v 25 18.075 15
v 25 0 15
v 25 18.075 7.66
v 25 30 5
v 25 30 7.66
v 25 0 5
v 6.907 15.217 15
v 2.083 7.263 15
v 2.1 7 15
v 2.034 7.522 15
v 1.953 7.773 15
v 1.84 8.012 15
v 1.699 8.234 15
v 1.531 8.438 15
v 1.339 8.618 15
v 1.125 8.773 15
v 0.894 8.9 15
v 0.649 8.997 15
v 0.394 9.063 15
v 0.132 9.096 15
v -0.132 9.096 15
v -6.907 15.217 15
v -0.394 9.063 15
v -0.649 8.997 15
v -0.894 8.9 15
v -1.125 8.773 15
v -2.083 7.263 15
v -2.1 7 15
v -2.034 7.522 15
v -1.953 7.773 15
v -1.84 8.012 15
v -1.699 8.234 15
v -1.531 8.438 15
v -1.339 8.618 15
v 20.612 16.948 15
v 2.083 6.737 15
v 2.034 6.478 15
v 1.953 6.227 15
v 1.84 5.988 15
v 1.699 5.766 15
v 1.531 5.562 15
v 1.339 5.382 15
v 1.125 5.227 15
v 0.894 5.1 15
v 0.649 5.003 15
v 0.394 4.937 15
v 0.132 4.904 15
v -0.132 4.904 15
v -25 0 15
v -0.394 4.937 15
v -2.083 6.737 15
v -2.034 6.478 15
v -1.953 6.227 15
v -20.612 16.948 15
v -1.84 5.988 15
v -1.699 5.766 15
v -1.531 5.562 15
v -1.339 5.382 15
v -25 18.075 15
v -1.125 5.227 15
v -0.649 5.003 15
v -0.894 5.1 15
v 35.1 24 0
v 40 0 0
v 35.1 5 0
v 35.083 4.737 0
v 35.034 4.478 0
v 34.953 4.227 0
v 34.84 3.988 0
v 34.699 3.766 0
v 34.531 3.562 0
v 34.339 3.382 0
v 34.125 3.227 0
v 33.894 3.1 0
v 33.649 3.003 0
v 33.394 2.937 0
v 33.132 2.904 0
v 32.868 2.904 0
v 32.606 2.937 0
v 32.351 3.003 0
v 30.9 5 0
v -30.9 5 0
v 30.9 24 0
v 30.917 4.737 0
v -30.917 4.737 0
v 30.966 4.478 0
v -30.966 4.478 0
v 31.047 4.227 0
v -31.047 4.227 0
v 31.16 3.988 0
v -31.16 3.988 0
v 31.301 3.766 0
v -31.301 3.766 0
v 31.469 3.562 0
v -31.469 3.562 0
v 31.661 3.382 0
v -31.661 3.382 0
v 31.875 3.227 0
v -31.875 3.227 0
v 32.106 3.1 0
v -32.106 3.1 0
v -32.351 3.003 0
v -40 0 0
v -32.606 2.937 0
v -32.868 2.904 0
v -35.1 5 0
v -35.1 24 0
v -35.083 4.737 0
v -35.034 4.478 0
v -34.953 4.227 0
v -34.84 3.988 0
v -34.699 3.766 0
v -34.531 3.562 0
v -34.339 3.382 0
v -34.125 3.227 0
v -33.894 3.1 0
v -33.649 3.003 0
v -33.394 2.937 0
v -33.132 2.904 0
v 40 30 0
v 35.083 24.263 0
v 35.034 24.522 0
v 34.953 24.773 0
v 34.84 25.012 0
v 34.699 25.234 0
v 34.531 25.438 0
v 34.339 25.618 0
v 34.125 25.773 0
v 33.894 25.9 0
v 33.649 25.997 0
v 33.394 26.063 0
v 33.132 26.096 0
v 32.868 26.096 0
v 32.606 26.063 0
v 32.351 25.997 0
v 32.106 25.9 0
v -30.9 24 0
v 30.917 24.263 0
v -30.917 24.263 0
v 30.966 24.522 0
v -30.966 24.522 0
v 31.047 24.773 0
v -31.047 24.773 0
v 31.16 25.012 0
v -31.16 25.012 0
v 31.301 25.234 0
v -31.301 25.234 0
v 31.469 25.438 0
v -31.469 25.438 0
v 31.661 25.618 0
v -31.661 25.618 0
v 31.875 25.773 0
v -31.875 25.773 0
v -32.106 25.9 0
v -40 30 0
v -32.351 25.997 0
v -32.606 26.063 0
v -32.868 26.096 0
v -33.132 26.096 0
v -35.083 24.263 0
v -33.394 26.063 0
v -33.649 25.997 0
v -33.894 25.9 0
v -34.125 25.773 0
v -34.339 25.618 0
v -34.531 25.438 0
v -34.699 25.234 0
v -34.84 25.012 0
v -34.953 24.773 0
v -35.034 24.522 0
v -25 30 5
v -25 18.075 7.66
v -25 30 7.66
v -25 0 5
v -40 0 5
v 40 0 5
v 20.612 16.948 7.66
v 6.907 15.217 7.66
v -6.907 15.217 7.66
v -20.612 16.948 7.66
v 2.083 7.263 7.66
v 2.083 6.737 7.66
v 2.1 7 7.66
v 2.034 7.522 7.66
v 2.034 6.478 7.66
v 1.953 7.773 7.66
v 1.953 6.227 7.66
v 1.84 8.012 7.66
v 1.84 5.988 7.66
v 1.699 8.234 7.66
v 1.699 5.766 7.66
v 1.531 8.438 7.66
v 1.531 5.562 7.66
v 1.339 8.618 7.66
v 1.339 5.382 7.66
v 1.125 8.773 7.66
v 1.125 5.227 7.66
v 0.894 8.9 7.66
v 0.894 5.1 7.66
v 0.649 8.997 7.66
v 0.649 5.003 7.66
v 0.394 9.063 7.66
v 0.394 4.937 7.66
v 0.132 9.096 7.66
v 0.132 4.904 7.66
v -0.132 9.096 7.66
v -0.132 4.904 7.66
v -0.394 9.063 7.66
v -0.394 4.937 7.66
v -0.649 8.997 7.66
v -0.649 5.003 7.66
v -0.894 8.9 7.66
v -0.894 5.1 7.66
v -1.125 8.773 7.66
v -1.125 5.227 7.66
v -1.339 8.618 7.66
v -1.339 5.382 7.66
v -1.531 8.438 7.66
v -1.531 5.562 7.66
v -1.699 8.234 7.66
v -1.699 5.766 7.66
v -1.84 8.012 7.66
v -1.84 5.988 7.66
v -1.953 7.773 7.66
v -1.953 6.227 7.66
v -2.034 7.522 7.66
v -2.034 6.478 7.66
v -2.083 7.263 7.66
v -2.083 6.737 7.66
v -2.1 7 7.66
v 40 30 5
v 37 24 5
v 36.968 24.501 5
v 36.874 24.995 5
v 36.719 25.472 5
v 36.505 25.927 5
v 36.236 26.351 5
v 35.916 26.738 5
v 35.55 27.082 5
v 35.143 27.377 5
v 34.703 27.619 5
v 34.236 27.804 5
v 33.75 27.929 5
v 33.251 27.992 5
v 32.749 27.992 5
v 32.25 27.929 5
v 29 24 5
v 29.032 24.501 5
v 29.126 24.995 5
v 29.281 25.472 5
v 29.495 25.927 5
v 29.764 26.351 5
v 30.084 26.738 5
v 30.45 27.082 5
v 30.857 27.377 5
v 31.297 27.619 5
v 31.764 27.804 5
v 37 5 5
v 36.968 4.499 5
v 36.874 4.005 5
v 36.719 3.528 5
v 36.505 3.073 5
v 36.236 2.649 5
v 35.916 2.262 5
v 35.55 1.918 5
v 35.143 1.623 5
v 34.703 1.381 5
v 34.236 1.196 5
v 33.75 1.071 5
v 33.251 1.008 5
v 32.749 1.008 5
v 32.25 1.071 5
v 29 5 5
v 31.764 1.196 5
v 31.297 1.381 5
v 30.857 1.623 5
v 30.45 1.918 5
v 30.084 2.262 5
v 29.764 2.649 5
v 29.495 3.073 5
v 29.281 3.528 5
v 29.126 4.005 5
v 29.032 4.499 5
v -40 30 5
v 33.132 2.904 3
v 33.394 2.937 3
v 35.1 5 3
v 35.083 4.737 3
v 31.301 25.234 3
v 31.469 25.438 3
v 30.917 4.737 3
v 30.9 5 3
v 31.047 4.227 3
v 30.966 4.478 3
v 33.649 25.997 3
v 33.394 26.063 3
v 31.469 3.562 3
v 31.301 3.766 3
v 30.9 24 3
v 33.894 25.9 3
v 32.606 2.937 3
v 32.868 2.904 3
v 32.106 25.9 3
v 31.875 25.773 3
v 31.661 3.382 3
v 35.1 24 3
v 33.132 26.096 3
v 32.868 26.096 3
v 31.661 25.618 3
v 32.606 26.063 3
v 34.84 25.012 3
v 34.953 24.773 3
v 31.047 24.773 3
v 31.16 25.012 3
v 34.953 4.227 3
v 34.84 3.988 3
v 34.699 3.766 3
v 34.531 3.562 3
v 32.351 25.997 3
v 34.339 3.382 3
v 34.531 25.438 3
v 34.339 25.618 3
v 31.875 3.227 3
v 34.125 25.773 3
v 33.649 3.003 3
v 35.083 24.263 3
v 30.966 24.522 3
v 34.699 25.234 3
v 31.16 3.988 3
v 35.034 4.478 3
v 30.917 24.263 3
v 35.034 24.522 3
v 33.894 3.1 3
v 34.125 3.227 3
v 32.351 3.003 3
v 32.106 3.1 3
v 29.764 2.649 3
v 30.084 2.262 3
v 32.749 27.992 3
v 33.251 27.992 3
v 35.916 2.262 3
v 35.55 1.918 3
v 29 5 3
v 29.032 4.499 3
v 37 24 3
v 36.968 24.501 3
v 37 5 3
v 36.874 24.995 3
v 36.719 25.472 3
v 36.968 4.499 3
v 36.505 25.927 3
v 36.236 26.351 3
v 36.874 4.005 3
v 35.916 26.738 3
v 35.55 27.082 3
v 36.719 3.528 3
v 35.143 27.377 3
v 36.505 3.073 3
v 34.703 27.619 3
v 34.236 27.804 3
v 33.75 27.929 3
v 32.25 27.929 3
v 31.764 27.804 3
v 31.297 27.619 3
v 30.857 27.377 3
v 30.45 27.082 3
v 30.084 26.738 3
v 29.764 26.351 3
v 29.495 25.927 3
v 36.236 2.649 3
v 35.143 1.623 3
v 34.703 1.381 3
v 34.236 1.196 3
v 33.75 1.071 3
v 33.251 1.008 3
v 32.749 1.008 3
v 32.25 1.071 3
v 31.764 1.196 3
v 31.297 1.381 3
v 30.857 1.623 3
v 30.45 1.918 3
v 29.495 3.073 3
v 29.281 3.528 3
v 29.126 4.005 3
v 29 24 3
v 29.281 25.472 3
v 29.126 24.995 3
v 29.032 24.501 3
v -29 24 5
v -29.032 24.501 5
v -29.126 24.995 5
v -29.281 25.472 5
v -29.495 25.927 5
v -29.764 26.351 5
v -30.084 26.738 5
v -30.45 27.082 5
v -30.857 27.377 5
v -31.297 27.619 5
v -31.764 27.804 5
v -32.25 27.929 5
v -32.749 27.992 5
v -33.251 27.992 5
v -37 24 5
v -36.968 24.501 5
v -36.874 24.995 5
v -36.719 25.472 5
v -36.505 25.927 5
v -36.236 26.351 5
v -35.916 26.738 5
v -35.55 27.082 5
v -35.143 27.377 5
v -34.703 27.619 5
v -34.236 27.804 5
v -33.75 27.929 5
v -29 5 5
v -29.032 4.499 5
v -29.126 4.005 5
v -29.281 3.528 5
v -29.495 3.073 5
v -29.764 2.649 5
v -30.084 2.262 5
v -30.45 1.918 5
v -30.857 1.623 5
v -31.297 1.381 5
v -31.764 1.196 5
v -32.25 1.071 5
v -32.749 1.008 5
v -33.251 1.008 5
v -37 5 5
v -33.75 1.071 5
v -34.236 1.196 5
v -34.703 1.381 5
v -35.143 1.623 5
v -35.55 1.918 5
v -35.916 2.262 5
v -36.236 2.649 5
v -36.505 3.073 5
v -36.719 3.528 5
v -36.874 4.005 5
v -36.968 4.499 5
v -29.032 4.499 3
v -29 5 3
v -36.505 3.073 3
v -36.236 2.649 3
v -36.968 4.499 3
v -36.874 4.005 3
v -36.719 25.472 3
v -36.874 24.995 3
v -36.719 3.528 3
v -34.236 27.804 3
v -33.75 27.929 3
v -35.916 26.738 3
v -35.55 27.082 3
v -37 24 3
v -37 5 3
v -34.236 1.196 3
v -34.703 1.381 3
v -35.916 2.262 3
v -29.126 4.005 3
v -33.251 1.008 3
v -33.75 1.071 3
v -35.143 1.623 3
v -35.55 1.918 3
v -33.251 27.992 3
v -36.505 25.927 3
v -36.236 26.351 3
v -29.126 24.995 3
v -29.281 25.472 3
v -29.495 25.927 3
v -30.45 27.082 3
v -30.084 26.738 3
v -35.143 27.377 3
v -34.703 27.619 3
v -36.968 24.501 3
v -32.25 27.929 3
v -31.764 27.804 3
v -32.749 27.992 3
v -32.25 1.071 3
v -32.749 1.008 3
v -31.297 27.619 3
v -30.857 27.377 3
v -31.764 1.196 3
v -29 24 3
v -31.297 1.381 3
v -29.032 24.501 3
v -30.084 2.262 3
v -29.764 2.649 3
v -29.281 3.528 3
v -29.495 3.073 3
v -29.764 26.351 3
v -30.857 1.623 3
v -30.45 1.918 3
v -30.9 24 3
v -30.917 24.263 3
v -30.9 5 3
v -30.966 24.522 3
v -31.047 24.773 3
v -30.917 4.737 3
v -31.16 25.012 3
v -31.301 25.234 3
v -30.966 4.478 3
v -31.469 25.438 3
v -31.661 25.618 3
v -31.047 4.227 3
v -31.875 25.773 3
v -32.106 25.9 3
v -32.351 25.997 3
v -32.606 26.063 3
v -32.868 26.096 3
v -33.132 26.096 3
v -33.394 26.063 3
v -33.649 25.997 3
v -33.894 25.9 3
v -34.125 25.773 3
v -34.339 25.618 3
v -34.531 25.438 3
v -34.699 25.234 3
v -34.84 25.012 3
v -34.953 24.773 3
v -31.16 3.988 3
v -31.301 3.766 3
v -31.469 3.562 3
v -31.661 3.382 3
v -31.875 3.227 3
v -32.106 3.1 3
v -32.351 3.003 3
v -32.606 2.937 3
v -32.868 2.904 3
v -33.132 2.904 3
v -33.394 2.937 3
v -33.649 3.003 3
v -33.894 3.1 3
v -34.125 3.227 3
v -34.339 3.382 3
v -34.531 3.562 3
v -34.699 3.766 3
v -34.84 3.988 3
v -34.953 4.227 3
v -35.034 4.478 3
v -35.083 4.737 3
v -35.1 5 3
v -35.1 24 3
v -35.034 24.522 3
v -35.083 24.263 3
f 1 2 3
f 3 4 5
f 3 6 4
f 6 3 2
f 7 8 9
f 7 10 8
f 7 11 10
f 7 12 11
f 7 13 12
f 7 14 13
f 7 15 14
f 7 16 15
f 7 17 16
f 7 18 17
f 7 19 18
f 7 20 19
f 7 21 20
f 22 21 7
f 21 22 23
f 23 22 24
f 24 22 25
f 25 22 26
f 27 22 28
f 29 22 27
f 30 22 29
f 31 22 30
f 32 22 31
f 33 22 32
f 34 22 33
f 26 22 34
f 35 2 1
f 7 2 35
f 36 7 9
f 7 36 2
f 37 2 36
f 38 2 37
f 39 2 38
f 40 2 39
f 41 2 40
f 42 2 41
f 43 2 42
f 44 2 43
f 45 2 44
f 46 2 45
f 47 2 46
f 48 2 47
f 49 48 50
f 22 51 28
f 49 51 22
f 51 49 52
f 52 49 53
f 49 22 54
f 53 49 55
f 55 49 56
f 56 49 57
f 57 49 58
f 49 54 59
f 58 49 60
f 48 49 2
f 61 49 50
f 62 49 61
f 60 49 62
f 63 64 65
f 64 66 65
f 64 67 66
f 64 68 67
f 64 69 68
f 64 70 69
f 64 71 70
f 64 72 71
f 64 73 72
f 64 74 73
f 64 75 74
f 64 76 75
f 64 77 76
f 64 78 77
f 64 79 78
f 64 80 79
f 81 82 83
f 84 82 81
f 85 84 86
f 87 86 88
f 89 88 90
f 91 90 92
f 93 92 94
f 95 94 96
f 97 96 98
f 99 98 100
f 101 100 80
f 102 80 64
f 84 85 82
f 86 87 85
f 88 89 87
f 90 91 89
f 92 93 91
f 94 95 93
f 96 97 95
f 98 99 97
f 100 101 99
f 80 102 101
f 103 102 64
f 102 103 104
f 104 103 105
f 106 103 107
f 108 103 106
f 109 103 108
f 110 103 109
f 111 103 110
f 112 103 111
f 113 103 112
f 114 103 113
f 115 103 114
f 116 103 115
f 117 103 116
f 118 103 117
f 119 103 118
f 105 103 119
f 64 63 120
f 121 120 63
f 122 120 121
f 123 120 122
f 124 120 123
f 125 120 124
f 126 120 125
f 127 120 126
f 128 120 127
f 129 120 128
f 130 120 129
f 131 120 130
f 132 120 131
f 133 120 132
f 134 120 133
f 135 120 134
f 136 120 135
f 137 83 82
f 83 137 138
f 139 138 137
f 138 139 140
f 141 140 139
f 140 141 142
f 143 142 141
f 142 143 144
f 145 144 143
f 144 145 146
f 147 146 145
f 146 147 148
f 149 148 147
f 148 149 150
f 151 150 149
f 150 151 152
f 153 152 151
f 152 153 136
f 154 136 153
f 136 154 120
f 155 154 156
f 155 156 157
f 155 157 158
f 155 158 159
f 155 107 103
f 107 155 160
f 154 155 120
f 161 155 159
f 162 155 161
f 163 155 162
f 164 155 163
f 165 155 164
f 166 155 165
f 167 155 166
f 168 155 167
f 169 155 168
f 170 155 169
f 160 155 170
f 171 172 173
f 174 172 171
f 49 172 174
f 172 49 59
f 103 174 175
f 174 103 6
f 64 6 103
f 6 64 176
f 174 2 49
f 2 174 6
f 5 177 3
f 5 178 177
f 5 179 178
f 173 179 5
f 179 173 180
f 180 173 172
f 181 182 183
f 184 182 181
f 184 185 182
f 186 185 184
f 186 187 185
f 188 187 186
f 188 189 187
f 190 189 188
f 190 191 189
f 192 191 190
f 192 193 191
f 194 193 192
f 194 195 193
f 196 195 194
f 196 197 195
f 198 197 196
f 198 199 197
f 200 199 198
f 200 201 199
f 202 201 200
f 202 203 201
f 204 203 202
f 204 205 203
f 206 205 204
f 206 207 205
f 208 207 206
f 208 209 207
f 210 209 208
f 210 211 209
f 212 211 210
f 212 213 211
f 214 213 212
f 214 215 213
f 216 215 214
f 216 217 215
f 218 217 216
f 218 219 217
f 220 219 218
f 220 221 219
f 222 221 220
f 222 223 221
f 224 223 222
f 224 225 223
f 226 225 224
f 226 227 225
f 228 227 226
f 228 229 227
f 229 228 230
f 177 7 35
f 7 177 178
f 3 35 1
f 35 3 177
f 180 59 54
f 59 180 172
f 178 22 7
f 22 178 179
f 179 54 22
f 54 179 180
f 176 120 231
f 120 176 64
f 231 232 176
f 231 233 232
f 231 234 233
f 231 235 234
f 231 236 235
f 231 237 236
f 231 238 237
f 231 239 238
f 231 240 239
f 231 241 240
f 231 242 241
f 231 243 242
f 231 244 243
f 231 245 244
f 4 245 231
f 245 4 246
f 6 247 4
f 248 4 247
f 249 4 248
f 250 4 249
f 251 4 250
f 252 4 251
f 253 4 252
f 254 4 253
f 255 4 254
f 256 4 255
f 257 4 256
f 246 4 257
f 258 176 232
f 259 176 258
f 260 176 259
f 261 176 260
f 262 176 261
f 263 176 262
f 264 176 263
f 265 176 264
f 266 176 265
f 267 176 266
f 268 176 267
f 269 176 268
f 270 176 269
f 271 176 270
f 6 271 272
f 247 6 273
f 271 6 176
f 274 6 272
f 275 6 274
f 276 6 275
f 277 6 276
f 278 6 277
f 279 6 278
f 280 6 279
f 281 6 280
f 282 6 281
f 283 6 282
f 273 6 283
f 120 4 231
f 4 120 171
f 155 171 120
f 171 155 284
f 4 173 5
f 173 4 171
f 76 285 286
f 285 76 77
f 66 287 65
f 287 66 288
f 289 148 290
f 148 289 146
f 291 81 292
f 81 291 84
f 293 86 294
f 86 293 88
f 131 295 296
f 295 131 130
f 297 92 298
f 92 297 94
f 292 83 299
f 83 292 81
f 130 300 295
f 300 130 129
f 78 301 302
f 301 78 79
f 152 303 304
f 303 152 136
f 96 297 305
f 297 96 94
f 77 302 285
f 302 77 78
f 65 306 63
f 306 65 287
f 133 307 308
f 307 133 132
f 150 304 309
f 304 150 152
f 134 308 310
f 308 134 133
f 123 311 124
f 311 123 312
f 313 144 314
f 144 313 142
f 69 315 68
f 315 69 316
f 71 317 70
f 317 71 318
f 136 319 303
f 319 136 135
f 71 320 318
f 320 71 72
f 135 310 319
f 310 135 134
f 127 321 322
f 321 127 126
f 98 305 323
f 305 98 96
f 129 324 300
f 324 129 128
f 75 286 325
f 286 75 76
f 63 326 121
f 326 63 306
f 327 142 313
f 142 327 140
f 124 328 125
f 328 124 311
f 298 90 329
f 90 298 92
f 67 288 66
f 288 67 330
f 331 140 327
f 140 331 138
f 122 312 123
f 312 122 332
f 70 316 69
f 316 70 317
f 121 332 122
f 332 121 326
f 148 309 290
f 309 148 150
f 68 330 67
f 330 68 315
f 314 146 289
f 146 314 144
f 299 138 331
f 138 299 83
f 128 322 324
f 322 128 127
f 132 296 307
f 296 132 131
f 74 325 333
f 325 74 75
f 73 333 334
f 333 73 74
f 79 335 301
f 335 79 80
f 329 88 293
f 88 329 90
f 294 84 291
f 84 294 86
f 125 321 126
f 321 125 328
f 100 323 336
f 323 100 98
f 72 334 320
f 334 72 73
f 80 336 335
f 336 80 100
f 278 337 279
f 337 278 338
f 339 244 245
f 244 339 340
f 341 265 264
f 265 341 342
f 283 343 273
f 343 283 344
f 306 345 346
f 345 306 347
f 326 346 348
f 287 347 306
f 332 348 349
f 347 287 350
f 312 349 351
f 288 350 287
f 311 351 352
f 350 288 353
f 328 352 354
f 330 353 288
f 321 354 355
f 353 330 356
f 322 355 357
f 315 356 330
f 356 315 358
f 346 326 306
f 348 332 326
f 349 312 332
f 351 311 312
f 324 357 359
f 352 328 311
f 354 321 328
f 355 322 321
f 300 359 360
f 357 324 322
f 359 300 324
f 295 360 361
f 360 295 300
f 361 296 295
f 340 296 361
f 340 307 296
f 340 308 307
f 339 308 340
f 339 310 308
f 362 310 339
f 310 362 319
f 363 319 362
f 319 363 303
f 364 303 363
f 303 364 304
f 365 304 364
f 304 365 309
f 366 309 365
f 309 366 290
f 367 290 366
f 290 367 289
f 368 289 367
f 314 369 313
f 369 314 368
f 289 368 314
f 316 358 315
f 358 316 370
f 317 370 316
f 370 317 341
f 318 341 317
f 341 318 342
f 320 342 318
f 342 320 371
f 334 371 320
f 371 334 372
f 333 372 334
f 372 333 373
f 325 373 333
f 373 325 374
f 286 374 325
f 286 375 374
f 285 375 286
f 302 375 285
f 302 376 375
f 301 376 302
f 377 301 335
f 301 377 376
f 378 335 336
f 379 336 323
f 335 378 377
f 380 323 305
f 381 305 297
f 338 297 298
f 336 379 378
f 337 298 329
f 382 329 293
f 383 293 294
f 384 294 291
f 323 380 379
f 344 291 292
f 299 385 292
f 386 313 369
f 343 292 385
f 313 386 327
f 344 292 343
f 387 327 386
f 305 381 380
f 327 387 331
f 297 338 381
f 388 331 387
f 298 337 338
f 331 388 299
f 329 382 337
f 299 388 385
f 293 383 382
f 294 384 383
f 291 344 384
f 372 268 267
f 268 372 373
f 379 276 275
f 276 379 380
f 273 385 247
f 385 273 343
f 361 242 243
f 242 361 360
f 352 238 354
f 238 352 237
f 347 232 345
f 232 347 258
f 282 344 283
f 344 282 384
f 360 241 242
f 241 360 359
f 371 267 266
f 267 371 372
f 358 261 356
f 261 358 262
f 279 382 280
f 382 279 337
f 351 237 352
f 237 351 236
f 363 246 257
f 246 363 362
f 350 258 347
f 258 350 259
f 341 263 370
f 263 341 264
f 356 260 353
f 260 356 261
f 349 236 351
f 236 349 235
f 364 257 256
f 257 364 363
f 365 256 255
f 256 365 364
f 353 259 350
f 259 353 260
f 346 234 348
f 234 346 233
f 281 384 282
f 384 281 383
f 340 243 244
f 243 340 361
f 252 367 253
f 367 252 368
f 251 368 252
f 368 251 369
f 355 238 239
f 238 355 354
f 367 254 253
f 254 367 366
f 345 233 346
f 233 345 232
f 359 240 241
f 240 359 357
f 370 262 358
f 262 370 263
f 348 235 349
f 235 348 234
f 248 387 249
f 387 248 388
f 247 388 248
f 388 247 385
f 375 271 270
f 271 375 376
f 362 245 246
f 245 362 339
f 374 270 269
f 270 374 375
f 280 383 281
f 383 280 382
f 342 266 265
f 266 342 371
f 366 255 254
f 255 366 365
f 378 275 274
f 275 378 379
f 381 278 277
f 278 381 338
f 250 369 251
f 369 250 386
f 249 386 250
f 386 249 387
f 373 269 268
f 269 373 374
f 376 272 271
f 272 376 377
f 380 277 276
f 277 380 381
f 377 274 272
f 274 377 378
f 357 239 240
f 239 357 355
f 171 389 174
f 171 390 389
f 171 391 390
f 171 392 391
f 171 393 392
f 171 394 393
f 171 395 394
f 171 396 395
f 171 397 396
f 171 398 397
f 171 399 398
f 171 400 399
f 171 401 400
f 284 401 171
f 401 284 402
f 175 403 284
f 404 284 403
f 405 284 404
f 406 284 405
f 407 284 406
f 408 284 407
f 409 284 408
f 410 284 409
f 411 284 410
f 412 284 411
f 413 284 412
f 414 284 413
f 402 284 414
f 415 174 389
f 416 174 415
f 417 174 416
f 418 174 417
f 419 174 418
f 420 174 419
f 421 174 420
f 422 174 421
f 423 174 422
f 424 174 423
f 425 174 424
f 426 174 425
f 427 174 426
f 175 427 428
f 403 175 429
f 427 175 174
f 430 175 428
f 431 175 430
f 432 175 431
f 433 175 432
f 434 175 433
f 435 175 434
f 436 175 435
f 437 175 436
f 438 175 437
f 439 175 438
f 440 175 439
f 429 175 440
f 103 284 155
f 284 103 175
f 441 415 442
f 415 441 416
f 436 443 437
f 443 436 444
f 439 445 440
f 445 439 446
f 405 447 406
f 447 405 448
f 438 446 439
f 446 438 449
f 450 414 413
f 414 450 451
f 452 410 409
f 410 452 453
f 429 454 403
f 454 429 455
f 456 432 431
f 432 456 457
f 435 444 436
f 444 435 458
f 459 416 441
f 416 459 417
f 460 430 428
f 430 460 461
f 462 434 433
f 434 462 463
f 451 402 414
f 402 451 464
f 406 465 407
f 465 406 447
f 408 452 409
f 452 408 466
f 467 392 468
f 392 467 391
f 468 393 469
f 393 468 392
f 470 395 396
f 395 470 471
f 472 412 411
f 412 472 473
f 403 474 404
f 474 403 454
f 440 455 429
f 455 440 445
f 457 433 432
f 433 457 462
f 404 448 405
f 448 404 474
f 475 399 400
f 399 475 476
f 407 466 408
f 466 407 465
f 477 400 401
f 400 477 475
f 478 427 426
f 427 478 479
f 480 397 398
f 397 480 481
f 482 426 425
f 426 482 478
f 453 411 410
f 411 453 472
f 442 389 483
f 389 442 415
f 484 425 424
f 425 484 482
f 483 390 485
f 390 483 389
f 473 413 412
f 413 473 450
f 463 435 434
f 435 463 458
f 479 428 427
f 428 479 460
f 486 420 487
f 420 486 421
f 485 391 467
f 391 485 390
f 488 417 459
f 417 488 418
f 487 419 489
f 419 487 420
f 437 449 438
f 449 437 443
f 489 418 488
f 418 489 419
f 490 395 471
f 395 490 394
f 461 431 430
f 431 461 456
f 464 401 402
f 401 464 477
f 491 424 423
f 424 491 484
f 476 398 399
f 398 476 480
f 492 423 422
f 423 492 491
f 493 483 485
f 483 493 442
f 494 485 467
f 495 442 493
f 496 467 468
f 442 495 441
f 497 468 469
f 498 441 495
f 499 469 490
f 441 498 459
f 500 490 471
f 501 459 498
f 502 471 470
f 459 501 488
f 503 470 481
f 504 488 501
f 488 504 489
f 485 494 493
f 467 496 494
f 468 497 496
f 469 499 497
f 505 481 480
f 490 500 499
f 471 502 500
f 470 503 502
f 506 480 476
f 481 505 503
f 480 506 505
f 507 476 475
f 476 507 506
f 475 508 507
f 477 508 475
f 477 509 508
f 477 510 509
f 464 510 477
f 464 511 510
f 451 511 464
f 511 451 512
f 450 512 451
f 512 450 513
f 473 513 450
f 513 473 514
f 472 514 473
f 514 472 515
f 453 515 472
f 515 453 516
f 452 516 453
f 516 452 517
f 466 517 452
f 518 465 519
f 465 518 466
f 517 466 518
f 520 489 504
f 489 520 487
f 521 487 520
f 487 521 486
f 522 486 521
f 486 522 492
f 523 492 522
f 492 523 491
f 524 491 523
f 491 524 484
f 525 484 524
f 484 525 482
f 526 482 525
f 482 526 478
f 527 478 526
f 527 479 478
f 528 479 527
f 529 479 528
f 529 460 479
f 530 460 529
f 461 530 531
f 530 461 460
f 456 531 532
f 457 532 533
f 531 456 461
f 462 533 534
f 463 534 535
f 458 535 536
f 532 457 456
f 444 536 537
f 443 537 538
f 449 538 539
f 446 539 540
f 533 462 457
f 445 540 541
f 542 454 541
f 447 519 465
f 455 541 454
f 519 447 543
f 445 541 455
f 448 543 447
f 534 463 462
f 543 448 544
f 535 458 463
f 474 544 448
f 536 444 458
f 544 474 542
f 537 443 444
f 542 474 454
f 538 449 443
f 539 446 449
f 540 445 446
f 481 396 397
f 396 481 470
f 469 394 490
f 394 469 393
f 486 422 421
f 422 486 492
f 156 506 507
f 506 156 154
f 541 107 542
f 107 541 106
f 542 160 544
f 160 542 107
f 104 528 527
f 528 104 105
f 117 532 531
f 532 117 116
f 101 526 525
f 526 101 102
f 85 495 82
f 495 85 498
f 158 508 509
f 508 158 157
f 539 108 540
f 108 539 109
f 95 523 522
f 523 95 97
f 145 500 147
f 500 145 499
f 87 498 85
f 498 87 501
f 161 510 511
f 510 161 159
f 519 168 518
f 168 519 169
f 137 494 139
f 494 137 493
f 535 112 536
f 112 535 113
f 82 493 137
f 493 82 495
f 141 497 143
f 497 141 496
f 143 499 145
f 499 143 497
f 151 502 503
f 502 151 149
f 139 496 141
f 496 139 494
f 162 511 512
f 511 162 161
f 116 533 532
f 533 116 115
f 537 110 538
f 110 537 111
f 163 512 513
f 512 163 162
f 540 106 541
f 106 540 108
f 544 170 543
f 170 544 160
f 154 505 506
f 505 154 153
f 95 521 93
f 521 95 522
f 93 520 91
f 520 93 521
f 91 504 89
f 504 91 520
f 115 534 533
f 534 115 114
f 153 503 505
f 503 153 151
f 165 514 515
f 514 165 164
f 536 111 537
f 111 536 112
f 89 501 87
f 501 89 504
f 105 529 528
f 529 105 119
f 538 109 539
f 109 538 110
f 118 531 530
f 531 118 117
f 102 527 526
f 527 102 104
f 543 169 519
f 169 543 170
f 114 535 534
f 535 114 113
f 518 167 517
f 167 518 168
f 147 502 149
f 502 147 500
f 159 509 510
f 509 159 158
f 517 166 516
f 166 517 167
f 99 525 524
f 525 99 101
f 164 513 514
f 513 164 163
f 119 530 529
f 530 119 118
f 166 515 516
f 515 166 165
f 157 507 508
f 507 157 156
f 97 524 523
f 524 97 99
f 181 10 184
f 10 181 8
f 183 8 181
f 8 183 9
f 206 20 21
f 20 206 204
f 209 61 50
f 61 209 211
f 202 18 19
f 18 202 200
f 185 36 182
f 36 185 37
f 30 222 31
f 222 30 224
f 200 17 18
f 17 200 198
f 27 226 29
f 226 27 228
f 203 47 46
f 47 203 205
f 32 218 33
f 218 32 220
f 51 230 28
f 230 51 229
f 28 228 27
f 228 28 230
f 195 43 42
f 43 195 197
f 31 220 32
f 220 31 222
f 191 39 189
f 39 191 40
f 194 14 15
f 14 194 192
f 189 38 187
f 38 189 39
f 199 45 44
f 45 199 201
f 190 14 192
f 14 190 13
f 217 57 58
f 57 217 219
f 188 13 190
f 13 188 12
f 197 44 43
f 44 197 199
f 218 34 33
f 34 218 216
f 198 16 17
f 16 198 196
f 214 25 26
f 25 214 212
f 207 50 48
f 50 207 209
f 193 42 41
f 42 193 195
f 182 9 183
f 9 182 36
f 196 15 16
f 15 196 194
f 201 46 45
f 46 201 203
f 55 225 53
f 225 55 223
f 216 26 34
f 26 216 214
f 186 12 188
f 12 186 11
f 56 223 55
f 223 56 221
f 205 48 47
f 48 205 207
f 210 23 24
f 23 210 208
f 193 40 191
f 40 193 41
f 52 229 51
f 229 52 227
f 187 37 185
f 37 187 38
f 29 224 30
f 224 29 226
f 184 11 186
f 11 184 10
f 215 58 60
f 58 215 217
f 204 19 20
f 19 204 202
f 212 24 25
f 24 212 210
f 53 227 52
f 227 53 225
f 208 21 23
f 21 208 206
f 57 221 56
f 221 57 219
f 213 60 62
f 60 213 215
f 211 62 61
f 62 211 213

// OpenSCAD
hotbed_diam = 220;
hotbed_thickness = 3.1;
s_thickness = 15;
s_lenght = 50;
s_widht = 20;
zplate_diam = 220;
zplate_thickness = 4.24;
back_support = 30;
support_widht = 10;
support_length = 15;

$fn = 50;
union(){
difference(){
union(){
difference(){
    translate([-s_lenght/2,0,0]) cube([s_lenght,s_widht,s_thickness]);
   
    translate([0,hotbed_diam/2+s_widht-5,(s_thickness-hotbed_thickness-zplate_thickness)]) cylinder(r=hotbed_diam/2,h=10);
    }
difference(){
    translate([s_lenght/2,0,0]) cube([support_length,back_support,5]);
    hull() {
        translate([s_lenght/2+8,5,0]) cylinder(r=2.1,h=5,center=false);
        translate([s_lenght/2+8,back_support-6,0]) cylinder(r=2.1,h=5,center=false);
    }
    hull() {
        translate([s_lenght/2+8,5,3]) cylinder(r=4,h=5,center=false);
        translate([s_lenght/2+8,back_support-6,3]) cylinder(r=4,h=5,center=false);}
}    

difference(){
    translate([(-s_lenght/2)-support_length,0,0]) cube([support_length,back_support,5]);
    hull() {
        translate([-s_lenght/2-8,5,3]) cylinder(r=4,h=5,center=false);
        translate([-s_lenght/2-8,back_support-6,3]) cylinder(r=4,h=5,center=false);
    }
    
        hull() {
        translate([-s_lenght/2-8,5,0]) cylinder(r=2.1,h=5,center=false);
        translate([-s_lenght/2-8,back_support-6,0]) cylinder(r=2.1,h=5,center=false);}
    }

}
translate([0,s_widht/2-3,0]) cylinder(r=2.1, h=s_widht);
}
translate([-s_lenght/2,0,0]) cube([s_lenght,s_widht+support_widht,(s_thickness-hotbed_thickness-zplate_thickness)]);
}
